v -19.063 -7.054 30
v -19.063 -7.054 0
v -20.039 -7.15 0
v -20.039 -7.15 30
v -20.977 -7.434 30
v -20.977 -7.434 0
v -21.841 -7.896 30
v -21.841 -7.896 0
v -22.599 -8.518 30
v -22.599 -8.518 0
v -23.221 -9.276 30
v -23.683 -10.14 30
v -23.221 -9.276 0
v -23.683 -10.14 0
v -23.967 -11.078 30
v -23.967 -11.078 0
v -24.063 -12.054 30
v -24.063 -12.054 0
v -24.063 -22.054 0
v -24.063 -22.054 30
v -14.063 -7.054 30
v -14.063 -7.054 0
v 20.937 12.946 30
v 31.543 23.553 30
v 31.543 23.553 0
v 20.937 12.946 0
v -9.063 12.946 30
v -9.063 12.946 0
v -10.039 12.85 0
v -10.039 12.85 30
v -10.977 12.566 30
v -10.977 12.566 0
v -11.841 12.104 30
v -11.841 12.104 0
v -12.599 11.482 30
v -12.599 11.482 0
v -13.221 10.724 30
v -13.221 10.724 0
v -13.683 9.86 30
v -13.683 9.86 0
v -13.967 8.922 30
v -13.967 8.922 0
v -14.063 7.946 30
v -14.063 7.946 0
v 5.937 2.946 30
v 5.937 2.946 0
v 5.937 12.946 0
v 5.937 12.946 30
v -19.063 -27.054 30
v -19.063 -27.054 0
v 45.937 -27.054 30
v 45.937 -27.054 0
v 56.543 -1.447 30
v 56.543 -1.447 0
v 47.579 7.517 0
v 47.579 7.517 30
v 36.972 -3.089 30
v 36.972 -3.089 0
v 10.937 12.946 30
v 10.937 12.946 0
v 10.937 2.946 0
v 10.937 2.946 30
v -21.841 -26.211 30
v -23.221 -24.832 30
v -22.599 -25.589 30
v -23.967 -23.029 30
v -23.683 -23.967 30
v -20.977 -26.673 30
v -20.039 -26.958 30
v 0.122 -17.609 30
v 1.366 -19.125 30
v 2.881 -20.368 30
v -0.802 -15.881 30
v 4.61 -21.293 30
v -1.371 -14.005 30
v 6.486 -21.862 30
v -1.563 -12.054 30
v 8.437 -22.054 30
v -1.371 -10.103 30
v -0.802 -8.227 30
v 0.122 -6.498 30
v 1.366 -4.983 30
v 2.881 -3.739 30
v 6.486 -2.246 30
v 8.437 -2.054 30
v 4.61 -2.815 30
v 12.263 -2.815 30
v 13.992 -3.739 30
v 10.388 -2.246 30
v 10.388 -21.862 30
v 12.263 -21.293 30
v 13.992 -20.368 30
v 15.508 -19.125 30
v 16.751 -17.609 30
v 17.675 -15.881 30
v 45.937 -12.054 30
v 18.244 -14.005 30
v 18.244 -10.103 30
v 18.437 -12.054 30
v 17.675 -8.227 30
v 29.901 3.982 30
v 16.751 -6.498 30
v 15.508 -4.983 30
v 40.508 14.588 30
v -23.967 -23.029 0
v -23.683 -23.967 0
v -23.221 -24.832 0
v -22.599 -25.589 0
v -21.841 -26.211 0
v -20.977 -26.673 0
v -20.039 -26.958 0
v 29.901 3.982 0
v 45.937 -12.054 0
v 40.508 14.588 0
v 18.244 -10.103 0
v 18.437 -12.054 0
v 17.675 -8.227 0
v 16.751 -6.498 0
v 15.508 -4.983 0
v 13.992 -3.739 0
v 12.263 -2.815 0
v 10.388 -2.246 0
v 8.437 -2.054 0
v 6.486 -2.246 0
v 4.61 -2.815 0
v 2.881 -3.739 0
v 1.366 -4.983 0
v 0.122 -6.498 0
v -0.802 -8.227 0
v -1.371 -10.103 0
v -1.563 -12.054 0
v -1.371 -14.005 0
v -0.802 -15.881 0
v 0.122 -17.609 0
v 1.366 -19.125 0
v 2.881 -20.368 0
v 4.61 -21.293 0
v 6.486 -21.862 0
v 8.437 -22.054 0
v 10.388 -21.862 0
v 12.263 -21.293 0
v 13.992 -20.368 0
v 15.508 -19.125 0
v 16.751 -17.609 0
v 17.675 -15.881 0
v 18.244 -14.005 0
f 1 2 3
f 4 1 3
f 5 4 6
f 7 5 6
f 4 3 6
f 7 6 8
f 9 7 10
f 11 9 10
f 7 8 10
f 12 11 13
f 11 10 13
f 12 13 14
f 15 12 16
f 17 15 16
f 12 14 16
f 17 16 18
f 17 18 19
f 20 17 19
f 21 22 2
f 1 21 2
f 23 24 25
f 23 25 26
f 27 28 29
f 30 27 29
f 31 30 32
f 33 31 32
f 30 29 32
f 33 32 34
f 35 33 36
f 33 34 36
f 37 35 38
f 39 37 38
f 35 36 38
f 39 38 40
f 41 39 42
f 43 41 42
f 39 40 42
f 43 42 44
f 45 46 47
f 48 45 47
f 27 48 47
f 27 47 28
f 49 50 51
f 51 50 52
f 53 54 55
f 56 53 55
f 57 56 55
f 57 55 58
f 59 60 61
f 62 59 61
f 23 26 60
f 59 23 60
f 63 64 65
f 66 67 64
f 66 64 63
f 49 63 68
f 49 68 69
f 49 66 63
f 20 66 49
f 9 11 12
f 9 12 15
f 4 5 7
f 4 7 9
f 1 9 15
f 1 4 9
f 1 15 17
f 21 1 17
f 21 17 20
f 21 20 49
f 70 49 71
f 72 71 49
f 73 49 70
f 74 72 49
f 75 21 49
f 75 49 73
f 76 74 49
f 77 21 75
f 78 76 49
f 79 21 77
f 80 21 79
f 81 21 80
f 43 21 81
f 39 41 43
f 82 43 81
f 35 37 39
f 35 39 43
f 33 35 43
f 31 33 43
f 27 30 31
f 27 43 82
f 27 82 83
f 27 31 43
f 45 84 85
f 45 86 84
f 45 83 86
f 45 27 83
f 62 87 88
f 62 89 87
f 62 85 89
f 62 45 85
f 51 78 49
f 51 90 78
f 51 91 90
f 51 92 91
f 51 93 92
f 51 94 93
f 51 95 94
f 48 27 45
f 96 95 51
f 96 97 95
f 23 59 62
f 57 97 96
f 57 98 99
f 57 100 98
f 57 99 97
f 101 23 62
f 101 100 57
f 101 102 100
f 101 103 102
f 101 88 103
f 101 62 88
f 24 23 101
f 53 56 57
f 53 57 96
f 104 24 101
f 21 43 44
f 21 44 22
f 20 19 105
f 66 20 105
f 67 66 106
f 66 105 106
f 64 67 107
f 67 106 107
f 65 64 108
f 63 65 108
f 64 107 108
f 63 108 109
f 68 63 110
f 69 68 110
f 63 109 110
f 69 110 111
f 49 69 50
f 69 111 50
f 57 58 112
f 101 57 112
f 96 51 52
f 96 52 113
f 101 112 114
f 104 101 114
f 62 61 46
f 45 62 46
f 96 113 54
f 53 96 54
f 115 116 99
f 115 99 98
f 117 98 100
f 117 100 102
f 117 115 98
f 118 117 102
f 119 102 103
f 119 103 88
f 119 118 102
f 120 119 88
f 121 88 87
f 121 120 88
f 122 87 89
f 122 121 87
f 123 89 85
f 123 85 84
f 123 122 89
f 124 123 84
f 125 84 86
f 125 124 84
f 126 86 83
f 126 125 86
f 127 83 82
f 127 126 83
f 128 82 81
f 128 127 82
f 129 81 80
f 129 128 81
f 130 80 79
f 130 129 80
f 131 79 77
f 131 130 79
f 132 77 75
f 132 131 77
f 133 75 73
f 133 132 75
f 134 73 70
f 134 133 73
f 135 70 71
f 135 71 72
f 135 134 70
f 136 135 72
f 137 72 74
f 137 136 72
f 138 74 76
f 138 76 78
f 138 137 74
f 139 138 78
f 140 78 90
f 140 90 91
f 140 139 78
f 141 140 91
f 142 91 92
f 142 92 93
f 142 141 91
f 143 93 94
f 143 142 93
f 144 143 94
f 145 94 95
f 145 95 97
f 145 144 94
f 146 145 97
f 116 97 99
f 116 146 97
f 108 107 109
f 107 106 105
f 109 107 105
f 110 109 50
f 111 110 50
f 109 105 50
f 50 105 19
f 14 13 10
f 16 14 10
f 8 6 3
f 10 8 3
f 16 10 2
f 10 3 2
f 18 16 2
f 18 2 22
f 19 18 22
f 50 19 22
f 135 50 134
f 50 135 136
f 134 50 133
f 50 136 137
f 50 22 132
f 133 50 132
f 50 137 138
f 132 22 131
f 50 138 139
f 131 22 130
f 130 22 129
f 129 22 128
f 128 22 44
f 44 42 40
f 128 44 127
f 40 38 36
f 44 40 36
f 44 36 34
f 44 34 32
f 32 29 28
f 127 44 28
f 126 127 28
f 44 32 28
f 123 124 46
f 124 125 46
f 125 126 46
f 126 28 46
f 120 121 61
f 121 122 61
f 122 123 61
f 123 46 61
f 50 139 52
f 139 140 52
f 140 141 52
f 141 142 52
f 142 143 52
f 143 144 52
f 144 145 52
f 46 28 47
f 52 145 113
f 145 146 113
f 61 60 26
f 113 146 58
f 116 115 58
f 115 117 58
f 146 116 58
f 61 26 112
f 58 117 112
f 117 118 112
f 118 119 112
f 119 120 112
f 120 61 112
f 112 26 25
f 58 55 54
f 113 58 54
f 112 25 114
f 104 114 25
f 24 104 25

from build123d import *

# Parameters (mm, degrees)
F0_R     = 10
F1_DEPTH = 30


with BuildPart() as f1:
    # F0 (on Top) → F1 (new body)
    with BuildSketch(Plane.XY):
        with BuildLine():
            ThreePointArc((-24.06338, -22.053742), (-22.598914, -25.589276), (-19.06338, -27.053742))
            Line((-19.06338, -27.053742), (45.93662, -27.053742))
            Line((45.93662, -27.053742), (45.93662, -12.053742))
            Line((45.93662, -12.053742), (56.543221, -1.44714))
            Line((56.543221, -1.44714), (47.578755, 7.517326))
            Line((47.578755, 7.517326), (36.972154, -3.089276))
            Line((36.972154, -3.089276), (29.901086, 3.981792))
            Line((29.901086, 3.981792), (40.507688, 14.588394))
            Line((40.507688, 14.588394), (31.543221, 23.55286))
            Line((31.543221, 23.55286), (20.93662, 12.946258))
            Line((20.93662, 12.946258), (10.93662, 12.946258))
            Line((10.93662, 12.946258), (10.93662, 2.946258))
            Line((10.93662, 2.946258), (5.93662, 2.946258))
            Line((5.93662, 2.946258), (5.93662, 12.946258))
            Line((5.93662, 12.946258), (-9.06338, 12.946258))
            ThreePointArc((-9.06338, 12.946258), (-12.598914, 11.481792), (-14.06338, 7.946258))
            Line((-14.06338, 7.946258), (-14.06338, -7.053742))
            Line((-14.06338, -7.053742), (-19.06338, -7.053742))
            ThreePointArc((-19.06338, -7.053742), (-22.598914, -8.518208), (-24.06338, -12.053742))
            Line((-24.06338, -12.053742), (-24.06338, -22.053742))
        make_face()
        with Locations((8.43662, -12.053742)):
            Circle(F0_R, mode=Mode.SUBTRACT)
    extrude(amount=F1_DEPTH)


solid = f1.part
